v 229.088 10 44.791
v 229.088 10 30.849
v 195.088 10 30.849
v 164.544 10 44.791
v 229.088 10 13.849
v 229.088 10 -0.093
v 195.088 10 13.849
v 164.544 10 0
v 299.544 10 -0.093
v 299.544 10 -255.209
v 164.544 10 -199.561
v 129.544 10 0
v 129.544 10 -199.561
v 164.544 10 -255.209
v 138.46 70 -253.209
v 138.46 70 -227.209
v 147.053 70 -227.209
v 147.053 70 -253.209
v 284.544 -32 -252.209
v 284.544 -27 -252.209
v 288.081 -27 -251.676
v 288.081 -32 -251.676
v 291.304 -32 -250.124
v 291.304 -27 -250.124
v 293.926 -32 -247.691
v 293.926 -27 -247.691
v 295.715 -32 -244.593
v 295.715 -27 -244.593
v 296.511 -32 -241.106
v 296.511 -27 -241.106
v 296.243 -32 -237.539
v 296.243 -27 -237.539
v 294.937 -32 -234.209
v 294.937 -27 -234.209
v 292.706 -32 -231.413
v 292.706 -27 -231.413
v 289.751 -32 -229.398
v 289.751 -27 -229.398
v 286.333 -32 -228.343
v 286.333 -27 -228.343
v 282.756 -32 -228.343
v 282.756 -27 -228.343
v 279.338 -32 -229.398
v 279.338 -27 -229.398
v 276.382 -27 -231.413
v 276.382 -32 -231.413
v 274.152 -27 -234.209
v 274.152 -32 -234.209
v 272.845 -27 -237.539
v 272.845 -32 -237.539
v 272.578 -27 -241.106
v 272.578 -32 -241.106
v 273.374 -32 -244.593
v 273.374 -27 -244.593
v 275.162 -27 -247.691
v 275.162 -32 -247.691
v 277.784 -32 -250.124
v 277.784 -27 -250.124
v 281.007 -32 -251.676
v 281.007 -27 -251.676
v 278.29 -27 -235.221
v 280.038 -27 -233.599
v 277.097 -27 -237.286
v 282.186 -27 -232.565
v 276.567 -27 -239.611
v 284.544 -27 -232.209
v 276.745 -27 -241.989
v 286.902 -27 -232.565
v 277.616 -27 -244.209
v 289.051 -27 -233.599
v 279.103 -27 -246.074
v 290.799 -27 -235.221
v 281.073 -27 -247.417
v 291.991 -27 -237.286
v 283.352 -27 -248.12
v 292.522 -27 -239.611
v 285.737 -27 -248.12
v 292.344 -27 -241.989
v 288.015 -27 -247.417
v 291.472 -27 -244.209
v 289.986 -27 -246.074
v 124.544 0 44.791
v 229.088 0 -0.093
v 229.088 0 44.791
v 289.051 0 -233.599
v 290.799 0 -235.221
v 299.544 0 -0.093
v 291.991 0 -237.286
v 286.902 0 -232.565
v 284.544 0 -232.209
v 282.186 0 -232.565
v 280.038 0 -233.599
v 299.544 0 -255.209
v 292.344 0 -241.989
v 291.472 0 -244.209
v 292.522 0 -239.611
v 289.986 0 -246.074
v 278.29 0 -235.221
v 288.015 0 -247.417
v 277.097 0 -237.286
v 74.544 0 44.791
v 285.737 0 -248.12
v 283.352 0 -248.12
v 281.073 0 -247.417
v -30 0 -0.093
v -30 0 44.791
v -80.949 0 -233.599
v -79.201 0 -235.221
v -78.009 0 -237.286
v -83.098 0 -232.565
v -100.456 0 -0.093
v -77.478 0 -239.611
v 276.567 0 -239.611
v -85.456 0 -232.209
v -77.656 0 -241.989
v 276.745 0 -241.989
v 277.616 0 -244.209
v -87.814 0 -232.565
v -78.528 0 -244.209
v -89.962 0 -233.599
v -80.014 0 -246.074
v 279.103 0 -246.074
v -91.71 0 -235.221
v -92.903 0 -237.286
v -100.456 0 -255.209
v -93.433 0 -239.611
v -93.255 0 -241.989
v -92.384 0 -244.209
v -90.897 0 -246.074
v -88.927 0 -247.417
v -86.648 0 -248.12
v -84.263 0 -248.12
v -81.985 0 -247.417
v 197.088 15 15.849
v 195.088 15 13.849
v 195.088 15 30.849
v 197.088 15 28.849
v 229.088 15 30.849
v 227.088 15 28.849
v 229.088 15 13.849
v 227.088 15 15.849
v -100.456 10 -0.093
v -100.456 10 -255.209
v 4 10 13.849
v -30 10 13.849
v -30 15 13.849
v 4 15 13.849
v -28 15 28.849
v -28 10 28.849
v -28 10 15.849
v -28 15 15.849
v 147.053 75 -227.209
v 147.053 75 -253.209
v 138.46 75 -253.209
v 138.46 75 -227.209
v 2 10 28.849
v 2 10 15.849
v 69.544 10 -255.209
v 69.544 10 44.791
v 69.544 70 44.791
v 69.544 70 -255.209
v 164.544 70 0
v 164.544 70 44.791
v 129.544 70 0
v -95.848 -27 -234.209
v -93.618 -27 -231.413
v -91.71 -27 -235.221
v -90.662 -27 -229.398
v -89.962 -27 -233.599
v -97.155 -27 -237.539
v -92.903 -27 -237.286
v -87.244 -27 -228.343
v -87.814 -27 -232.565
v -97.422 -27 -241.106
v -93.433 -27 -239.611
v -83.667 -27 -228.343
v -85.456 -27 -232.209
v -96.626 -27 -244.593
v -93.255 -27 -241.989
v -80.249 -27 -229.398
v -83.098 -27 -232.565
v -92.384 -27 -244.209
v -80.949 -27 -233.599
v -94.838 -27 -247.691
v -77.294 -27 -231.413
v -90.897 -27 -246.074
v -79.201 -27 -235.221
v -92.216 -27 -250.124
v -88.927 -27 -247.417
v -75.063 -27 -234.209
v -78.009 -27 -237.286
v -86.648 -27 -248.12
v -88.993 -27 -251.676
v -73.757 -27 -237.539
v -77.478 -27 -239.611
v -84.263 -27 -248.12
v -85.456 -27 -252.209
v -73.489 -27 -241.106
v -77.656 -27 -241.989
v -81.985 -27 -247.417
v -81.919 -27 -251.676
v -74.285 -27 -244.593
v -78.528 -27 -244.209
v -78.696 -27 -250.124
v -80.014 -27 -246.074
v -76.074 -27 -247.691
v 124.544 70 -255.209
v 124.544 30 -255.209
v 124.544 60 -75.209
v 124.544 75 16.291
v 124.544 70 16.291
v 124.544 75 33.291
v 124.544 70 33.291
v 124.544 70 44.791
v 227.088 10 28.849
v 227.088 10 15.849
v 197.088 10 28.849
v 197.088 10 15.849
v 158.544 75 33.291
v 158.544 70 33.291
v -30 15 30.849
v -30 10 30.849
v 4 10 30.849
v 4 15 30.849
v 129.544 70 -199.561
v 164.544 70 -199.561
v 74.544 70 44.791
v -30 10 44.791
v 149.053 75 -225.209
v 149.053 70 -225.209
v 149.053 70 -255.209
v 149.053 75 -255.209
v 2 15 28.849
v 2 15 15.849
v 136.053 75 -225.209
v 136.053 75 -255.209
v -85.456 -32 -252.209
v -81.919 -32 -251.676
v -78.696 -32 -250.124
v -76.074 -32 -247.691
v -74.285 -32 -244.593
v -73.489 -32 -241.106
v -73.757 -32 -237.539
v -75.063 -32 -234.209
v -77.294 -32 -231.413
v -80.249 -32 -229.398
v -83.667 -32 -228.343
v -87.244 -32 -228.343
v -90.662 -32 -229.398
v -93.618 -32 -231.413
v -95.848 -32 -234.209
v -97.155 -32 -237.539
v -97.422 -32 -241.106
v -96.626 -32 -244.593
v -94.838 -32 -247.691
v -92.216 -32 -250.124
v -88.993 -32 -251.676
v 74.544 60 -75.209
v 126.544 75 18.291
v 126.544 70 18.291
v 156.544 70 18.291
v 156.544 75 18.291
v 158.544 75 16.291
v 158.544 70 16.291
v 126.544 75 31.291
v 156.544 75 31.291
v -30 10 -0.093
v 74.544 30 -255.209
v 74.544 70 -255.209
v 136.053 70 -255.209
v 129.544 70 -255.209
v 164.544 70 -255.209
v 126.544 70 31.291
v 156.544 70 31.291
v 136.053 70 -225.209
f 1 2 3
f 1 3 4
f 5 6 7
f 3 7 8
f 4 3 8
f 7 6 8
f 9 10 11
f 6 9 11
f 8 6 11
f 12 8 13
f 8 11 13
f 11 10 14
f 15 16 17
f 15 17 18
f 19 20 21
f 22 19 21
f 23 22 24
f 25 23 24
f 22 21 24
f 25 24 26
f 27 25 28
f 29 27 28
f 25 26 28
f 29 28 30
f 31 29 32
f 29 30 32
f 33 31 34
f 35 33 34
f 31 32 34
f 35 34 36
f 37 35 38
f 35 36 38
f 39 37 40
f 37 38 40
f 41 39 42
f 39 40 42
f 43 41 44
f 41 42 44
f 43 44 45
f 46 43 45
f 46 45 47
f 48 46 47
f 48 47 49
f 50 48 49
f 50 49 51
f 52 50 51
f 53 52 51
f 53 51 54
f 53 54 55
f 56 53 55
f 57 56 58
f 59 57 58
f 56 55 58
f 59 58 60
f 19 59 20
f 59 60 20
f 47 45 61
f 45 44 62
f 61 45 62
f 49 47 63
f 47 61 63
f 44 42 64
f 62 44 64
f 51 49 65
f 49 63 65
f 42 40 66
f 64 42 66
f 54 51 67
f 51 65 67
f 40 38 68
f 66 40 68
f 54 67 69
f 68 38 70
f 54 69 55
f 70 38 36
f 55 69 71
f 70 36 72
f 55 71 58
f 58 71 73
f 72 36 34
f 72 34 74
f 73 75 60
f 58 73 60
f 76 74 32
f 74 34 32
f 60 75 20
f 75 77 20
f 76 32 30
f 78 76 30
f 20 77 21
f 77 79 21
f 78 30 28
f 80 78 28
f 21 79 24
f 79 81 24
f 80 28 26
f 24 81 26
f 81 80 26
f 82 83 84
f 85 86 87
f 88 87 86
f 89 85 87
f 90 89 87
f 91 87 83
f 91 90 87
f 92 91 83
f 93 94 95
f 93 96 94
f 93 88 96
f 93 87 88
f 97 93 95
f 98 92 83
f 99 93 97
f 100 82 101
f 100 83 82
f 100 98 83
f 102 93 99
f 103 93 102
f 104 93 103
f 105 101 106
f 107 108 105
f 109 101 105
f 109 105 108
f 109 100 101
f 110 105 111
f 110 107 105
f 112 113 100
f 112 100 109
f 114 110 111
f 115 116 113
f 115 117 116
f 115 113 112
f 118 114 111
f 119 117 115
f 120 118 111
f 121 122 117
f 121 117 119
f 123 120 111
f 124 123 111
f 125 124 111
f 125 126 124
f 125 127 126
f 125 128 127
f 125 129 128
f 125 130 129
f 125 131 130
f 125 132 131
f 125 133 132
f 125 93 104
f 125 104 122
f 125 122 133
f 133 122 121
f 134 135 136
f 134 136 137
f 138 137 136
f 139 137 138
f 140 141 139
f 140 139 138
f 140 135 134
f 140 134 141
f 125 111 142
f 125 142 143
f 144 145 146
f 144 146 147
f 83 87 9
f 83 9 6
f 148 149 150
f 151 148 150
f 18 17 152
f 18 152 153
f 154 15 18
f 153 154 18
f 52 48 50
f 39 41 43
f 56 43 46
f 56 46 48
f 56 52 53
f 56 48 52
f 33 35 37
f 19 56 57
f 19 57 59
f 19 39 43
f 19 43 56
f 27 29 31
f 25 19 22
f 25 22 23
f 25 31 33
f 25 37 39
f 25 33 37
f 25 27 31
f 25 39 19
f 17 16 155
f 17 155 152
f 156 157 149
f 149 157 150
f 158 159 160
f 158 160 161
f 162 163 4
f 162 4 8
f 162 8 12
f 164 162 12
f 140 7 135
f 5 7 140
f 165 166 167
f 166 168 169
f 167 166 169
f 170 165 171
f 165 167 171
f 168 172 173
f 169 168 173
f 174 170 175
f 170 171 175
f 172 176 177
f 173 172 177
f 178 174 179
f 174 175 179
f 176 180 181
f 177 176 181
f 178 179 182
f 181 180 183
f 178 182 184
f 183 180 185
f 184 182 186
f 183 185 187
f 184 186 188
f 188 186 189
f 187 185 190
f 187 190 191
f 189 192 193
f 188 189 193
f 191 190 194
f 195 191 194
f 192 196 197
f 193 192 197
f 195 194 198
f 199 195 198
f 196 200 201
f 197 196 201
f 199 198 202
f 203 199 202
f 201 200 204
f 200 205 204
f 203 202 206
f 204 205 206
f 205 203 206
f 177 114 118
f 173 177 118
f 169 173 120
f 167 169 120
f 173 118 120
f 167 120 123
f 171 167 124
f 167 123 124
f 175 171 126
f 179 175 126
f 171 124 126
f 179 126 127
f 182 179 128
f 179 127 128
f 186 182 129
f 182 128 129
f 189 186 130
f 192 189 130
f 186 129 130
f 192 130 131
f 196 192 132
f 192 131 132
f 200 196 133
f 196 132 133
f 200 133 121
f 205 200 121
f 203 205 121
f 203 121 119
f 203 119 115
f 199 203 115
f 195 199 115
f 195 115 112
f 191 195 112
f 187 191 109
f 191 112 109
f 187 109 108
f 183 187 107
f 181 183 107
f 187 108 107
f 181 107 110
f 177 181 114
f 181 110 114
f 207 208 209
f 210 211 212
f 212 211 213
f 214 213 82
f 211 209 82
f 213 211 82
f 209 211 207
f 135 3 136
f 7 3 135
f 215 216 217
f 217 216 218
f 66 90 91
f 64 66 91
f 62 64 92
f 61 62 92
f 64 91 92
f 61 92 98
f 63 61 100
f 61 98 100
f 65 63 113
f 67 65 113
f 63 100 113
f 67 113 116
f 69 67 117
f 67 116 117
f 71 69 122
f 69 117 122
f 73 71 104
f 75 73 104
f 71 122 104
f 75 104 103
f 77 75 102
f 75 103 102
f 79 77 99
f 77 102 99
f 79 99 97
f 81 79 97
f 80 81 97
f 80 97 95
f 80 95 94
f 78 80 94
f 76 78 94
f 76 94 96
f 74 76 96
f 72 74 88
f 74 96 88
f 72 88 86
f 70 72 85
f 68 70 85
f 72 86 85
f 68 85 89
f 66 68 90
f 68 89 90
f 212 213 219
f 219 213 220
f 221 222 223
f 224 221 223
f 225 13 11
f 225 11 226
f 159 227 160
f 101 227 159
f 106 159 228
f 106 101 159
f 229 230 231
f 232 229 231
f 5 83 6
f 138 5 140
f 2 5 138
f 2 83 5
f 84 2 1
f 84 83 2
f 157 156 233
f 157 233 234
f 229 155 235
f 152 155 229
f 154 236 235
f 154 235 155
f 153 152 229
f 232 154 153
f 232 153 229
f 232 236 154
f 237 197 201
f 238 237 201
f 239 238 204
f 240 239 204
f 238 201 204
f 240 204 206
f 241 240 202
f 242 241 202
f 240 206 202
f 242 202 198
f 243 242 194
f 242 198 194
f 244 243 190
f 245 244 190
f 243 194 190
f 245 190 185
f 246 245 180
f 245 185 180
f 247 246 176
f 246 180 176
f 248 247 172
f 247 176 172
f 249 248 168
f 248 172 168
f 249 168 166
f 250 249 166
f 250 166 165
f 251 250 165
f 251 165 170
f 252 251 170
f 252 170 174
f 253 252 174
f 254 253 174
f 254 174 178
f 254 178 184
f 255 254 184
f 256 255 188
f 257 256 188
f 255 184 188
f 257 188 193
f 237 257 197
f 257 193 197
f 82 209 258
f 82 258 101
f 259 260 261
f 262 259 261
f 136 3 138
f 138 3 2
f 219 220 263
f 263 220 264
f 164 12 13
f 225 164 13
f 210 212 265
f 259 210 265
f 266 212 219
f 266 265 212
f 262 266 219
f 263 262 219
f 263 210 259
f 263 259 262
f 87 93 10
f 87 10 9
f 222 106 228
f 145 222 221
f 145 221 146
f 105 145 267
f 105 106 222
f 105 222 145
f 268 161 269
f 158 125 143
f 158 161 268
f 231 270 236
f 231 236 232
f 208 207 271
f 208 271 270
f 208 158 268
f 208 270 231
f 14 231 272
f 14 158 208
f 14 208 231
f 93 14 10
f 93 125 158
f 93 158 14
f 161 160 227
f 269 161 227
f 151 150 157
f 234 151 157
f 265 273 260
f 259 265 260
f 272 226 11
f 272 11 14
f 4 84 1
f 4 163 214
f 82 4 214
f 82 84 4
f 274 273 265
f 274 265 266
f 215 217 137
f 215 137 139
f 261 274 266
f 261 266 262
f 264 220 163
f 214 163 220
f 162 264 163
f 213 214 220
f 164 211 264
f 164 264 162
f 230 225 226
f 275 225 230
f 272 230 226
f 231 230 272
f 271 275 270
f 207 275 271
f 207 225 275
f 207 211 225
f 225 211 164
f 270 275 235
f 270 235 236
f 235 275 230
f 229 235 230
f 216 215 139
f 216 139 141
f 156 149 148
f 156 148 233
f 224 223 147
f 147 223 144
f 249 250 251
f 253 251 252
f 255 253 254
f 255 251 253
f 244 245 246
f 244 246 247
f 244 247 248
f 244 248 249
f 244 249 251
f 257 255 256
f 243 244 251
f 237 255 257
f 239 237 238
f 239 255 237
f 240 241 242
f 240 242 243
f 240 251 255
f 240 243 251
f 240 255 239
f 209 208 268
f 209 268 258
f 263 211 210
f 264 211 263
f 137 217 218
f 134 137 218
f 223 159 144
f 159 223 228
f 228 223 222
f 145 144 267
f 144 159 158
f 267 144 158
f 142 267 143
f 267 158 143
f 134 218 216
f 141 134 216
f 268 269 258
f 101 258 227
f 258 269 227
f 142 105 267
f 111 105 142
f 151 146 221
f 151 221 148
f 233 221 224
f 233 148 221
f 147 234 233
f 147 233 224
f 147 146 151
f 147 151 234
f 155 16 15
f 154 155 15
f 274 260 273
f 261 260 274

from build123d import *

# Parameters (mm, degrees)
BOSS_EXTRUDE3_DEPTH  = 10
SKETCH2_W            = 34
SKETCH2_H            = 17
SKETCH2_W_2          = 30
SKETCH2_H_2          = 13
BOSS_EXTRUDE4_DEPTH  = 5
SKETCH3_W            = 50
SKETCH3_H            = 120
BOSS_EXTRUDE5_DEPTH  = 50
CUT_EXTRUDE2_DEPTH   = 50
SKETCH5_W            = 50
SKETCH5_H            = 180
BOSS_EXTRUDE6_DEPTH  = 50
CUT_EXTRUDE3_DEPTH   = 346.480399988
SKETCH7_W            = 5
SKETCH7_H            = 300
BOSS_EXTRUDE7_DEPTH  = 70
SKETCH9_W            = 34
SKETCH9_H            = 17
SKETCH9_W_2          = 30
SKETCH9_H_2          = 13
BOSS_EXTRUDE8_DEPTH  = 5
SKETCH10_W           = 55.647662557
SKETCH10_H           = 60
BOSS_EXTRUDE9_DEPTH  = 35
SKETCH13_W           = 13
SKETCH13_H           = 30
SKETCH13_W_2         = 8.592805021
SKETCH13_H_2         = 26
BOSS_EXTRUDE11_DEPTH = 5
SKETCH14_R           = 8
BOSS_EXTRUDE12_DEPTH = 27
SKETCH16_R           = 8
BOSS_EXTRUDE13_DEPTH = 27
SKETCH17_R           = 12
BOSS_EXTRUDE14_DEPTH = 5
SKETCH18_R           = 12
BOSS_EXTRUDE15_DEPTH = 5


with BuildPart() as part:
    # Sketch1 → Boss-Extrude3 (new body)
    with BuildSketch(Plane(origin=(0, 0, 0), x_dir=(1, 0, 0), z_dir=(0, 1, 0))):
        Polygon((-100.4558, 255.209143206), (299.5442, 255.209143206), (299.5442, 0.092543206), (229.0884, 0.092543206), (229.0884, -44.790856794), (-30, -44.790856794), (-30, 0.092543206), (-100.4558, 0.092543206), align=None)
    extrude(amount=BOSS_EXTRUDE3_DEPTH)

    # Sketch2 → Boss-Extrude4 (add)
    # profile 1 of 2: a face of its own
    with BuildSketch(Plane(origin=(0, 10, 0), x_dir=(1, 0, 0), z_dir=(0, 1, 0))):
        with Locations((-13, -22.349156794)):
            Rectangle(SKETCH2_W, SKETCH2_H)
        with Locations((-13, -22.349156794)):
            Rectangle(SKETCH2_W_2, SKETCH2_H_2, mode=Mode.SUBTRACT)
    # profile 2 of 2: a face of its own
    with BuildSketch(Plane(origin=(0, 10, 0), x_dir=(1, 0, 0), z_dir=(0, 1, 0))):
        with Locations((212.0884, -22.349156794)):
            Rectangle(SKETCH2_W, SKETCH2_H)
        with Locations((212.0884, -22.349156794)):
            Rectangle(SKETCH2_W_2, SKETCH2_H_2, mode=Mode.SUBTRACT)
    extrude(amount=BOSS_EXTRUDE4_DEPTH)

    # Sketch3 → Boss-Extrude5 (add)
    with BuildSketch(Plane(origin=(0, 10, 0), x_dir=(1, 0, 0), z_dir=(0, 1, 0))):
        with Locations((99.5442, 15.209143206)):
            Rectangle(SKETCH3_W, SKETCH3_H)
    extrude(amount=BOSS_EXTRUDE5_DEPTH)

    # Sketch4 → Cut-Extrude2 (cut)
    with BuildSketch(Plane(origin=(124.5442, 0, 0), x_dir=(0, 0, -1), z_dir=(1, 0, 0))):
        Polygon((-44.790856794, 60), (75.209143206, 60), (-44.790856794, 0), align=None)
    extrude(amount=-CUT_EXTRUDE2_DEPTH, mode=Mode.SUBTRACT)

    # Sketch5 → Boss-Extrude6 (add)
    with BuildSketch(Plane(origin=(0, 10, 0), x_dir=(1, 0, 0), z_dir=(0, 1, 0))):
        with Locations((99.5442, 165.209143206)):
            Rectangle(SKETCH5_W, SKETCH5_H)
    extrude(amount=BOSS_EXTRUDE6_DEPTH)

    # Sketch6 → Cut-Extrude3 (cut, through all)
    with BuildSketch(Plane(origin=(124.5442, 0, 0), x_dir=(0, 0, -1), z_dir=(1, 0, 0))):
        Polygon((75.209143206, 60), (255.209143206, 60), (255.209143206, 30), align=None)
    extrude(amount=-CUT_EXTRUDE3_DEPTH, mode=Mode.SUBTRACT)

    # Sketch7 → Boss-Extrude7 (add)
    with BuildSketch(Plane(origin=(0, 0, 0), x_dir=(1, 0, 0), z_dir=(0, 1, 0))):
        with Locations((72.0442, 105.209143206)):
            Rectangle(SKETCH7_W, SKETCH7_H)
        Polygon((129.5442, 255.209143206), (124.5442, 255.209143206), (124.5442, -44.790856794), (164.5442, -44.790856794), (164.5442, 0), (129.5442, 0), align=None)
    extrude(amount=BOSS_EXTRUDE7_DEPTH)

    # Sketch9 → Boss-Extrude8 (add)
    with BuildSketch(Plane(origin=(0, 70, 0), x_dir=(1, 0, 0), z_dir=(0, 1, 0))):
        with Locations((141.5442, -24.790856794)):
            Rectangle(SKETCH9_W, SKETCH9_H)
        with Locations((141.5442, -24.790856794)):
            Rectangle(SKETCH9_W_2, SKETCH9_H_2, mode=Mode.SUBTRACT)
    extrude(amount=BOSS_EXTRUDE8_DEPTH)

    # Sketch10 → Boss-Extrude9 (add)
    with BuildSketch(Plane(origin=(129.5442, 0, 0), x_dir=(0, 0, -1), z_dir=(1, 0, 0))):
        with Locations((227.385311928, 40)):
            Rectangle(SKETCH10_W, SKETCH10_H)
    extrude(amount=BOSS_EXTRUDE9_DEPTH)

    # Sketch13 → Boss-Extrude11 (add)
    with BuildSketch(Plane(origin=(0, 70, 0), x_dir=(1, 0, 0), z_dir=(0, 1, 0))):
        with Locations((142.552716242, 240.209143206)):
            Rectangle(SKETCH13_W, SKETCH13_H)
        with Locations((142.756313732, 240.209143206)):
            Rectangle(SKETCH13_W_2, SKETCH13_H_2, mode=Mode.SUBTRACT)
    extrude(amount=BOSS_EXTRUDE11_DEPTH)

    # Sketch14 → Boss-Extrude12 (add)
    with BuildSketch(Plane.XZ):
        with Locations(Location((284.5442, -240.209143206, 0), (0, 0, 90))):
            Circle(SKETCH14_R)
    extrude(amount=BOSS_EXTRUDE12_DEPTH)

    # Sketch16 → Boss-Extrude13 (add)
    with BuildSketch(Plane.XZ):
        with Locations(Location((-85.4558, -240.209143206, 0), (0, 0, 90))):
            Circle(SKETCH16_R)
    extrude(amount=BOSS_EXTRUDE13_DEPTH)

    # Sketch17 → Boss-Extrude14 (add)
    with BuildSketch(Plane.XZ.offset(27)):
        with Locations(Location((284.5442, -240.209143206, 0), (0, 0, 270))):
            Circle(SKETCH17_R)
    extrude(amount=BOSS_EXTRUDE14_DEPTH)

    # Sketch18 → Boss-Extrude15 (add)
    with BuildSketch(Plane.XZ.offset(27)):
        with Locations(Location((-85.4558, -240.209143206, 0), (0, 0, 270))):
            Circle(SKETCH18_R)
    extrude(amount=BOSS_EXTRUDE15_DEPTH)


solid = part.part
